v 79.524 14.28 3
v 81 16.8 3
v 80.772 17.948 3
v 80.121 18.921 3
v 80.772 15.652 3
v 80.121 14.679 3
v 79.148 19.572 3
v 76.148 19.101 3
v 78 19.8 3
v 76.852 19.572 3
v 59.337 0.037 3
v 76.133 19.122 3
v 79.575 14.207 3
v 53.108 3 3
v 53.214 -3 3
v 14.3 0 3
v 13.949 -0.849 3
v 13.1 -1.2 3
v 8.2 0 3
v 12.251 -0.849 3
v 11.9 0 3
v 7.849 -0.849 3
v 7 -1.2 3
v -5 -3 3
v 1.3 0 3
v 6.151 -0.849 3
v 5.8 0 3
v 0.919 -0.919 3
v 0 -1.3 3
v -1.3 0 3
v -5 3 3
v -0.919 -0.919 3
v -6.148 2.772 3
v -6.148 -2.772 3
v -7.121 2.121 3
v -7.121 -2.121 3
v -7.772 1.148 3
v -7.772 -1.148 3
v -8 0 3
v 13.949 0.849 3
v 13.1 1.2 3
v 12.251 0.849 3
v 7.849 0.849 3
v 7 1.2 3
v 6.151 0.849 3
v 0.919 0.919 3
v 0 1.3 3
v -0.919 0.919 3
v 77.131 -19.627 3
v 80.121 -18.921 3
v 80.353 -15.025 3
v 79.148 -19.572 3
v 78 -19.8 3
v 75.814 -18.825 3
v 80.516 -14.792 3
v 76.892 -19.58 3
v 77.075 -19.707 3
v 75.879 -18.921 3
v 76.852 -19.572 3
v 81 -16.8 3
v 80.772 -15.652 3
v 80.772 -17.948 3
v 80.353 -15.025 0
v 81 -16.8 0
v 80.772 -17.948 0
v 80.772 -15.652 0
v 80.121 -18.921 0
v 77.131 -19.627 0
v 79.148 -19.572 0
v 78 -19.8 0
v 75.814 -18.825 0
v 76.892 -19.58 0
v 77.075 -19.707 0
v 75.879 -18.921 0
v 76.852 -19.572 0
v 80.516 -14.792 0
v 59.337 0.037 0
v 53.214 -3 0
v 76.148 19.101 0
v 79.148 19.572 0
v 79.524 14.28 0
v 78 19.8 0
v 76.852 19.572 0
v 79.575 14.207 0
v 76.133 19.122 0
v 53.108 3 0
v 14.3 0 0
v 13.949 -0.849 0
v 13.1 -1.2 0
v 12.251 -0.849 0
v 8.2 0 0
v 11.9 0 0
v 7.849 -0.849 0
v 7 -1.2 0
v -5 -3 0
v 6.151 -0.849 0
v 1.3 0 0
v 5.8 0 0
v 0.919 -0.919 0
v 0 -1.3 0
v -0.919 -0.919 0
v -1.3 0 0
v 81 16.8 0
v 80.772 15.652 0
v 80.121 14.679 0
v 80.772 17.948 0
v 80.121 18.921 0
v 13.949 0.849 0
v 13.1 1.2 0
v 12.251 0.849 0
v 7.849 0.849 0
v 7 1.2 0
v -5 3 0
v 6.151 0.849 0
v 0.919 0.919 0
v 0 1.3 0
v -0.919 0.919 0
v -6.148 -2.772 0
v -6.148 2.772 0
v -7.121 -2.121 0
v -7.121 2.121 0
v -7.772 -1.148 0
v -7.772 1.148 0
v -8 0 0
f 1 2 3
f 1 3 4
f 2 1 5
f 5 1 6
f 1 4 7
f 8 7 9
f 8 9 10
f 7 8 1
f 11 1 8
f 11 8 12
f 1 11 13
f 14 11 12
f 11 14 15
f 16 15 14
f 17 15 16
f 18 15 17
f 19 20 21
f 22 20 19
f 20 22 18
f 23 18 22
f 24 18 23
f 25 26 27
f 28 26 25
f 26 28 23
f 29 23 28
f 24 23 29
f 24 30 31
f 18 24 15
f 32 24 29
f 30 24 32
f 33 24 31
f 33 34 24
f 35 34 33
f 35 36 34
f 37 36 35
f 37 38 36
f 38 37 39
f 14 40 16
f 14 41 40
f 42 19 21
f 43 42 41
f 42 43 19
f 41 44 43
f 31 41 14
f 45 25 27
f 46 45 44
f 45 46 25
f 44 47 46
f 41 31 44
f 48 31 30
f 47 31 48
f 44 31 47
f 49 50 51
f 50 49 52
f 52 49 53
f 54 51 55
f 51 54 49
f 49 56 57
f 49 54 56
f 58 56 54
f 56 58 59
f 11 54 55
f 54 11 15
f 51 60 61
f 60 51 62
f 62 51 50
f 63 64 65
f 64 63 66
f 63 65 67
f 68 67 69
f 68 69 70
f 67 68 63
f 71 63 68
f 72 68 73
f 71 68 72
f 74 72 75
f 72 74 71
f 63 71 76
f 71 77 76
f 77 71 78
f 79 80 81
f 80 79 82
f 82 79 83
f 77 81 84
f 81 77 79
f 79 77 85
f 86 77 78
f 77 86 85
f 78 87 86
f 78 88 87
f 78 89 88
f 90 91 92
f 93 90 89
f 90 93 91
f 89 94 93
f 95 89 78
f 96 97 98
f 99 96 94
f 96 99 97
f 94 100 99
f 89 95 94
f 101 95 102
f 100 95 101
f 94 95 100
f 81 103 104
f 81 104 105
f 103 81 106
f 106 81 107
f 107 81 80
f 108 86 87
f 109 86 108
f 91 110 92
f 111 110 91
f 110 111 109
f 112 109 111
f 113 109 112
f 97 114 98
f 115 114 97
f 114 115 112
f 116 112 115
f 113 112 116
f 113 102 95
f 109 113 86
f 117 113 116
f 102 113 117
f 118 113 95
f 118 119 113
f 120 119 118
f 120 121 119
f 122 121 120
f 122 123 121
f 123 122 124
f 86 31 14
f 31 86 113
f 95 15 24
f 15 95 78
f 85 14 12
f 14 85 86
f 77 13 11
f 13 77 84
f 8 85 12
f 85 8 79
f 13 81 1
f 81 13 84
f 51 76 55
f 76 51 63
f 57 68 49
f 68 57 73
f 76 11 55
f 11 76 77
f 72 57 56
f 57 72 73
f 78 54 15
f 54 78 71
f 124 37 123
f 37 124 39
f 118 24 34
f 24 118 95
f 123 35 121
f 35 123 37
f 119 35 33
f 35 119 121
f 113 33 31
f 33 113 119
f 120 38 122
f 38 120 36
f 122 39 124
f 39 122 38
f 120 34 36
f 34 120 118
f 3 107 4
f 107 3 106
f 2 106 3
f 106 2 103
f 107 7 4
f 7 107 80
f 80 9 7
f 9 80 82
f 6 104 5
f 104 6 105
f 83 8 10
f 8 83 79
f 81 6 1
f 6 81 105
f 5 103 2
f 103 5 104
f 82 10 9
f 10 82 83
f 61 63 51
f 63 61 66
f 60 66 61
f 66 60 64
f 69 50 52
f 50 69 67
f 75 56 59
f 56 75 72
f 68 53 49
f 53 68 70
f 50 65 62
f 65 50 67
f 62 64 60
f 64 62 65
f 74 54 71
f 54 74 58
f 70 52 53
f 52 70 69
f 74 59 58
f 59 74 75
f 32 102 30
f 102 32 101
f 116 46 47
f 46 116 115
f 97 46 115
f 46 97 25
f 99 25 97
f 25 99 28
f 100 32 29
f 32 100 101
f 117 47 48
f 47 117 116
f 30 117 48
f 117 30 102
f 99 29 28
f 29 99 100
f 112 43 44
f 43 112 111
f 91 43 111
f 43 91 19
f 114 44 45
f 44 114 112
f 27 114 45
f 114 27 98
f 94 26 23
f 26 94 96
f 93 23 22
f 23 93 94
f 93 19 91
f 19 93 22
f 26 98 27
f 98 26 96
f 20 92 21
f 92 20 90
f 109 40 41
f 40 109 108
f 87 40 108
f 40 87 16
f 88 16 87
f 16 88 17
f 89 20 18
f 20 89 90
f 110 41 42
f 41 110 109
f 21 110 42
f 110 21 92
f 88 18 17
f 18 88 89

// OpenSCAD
// B_ROBOT
// Arduino 3D printed Self Balancig Robot project
// Author: Jose Julio

// Arm for robot raiseup (conected to a mini servo)

module base()
{
	translate([-5,-3,0]) cube([60,6,3]);
	translate([55,-3,0]) rotate([0,0,35]) cube([30,6,3]);
	translate([52.5,-2.5,0]) rotate([0,0,325]) cube([30,6,3]);
	translate([-5,0,1.5]) cylinder(r=3,h=3,center=true,$fn=16);
	translate([78,16.8,1.5]) cylinder(r=3,h=3,center=true,$fn=16);
	translate([78,-16.8,1.5]) cylinder(r=3,h=3,center=true,$fn=16);
	//translate([42,0,2.5]) sphere(r=2.5,$fn=32);

}

module holes()
{
	cylinder(r=1.3,h=10,center=true,$fn=8);
	translate([7,0,0]) cylinder(r=1.2,h=10,center=true,$fn=8);
	translate([13.1,0,0]) cylinder(r=1.2,h=10,center=true,$fn=8);
}

difference()
{ 
	base();
	holes();
}
